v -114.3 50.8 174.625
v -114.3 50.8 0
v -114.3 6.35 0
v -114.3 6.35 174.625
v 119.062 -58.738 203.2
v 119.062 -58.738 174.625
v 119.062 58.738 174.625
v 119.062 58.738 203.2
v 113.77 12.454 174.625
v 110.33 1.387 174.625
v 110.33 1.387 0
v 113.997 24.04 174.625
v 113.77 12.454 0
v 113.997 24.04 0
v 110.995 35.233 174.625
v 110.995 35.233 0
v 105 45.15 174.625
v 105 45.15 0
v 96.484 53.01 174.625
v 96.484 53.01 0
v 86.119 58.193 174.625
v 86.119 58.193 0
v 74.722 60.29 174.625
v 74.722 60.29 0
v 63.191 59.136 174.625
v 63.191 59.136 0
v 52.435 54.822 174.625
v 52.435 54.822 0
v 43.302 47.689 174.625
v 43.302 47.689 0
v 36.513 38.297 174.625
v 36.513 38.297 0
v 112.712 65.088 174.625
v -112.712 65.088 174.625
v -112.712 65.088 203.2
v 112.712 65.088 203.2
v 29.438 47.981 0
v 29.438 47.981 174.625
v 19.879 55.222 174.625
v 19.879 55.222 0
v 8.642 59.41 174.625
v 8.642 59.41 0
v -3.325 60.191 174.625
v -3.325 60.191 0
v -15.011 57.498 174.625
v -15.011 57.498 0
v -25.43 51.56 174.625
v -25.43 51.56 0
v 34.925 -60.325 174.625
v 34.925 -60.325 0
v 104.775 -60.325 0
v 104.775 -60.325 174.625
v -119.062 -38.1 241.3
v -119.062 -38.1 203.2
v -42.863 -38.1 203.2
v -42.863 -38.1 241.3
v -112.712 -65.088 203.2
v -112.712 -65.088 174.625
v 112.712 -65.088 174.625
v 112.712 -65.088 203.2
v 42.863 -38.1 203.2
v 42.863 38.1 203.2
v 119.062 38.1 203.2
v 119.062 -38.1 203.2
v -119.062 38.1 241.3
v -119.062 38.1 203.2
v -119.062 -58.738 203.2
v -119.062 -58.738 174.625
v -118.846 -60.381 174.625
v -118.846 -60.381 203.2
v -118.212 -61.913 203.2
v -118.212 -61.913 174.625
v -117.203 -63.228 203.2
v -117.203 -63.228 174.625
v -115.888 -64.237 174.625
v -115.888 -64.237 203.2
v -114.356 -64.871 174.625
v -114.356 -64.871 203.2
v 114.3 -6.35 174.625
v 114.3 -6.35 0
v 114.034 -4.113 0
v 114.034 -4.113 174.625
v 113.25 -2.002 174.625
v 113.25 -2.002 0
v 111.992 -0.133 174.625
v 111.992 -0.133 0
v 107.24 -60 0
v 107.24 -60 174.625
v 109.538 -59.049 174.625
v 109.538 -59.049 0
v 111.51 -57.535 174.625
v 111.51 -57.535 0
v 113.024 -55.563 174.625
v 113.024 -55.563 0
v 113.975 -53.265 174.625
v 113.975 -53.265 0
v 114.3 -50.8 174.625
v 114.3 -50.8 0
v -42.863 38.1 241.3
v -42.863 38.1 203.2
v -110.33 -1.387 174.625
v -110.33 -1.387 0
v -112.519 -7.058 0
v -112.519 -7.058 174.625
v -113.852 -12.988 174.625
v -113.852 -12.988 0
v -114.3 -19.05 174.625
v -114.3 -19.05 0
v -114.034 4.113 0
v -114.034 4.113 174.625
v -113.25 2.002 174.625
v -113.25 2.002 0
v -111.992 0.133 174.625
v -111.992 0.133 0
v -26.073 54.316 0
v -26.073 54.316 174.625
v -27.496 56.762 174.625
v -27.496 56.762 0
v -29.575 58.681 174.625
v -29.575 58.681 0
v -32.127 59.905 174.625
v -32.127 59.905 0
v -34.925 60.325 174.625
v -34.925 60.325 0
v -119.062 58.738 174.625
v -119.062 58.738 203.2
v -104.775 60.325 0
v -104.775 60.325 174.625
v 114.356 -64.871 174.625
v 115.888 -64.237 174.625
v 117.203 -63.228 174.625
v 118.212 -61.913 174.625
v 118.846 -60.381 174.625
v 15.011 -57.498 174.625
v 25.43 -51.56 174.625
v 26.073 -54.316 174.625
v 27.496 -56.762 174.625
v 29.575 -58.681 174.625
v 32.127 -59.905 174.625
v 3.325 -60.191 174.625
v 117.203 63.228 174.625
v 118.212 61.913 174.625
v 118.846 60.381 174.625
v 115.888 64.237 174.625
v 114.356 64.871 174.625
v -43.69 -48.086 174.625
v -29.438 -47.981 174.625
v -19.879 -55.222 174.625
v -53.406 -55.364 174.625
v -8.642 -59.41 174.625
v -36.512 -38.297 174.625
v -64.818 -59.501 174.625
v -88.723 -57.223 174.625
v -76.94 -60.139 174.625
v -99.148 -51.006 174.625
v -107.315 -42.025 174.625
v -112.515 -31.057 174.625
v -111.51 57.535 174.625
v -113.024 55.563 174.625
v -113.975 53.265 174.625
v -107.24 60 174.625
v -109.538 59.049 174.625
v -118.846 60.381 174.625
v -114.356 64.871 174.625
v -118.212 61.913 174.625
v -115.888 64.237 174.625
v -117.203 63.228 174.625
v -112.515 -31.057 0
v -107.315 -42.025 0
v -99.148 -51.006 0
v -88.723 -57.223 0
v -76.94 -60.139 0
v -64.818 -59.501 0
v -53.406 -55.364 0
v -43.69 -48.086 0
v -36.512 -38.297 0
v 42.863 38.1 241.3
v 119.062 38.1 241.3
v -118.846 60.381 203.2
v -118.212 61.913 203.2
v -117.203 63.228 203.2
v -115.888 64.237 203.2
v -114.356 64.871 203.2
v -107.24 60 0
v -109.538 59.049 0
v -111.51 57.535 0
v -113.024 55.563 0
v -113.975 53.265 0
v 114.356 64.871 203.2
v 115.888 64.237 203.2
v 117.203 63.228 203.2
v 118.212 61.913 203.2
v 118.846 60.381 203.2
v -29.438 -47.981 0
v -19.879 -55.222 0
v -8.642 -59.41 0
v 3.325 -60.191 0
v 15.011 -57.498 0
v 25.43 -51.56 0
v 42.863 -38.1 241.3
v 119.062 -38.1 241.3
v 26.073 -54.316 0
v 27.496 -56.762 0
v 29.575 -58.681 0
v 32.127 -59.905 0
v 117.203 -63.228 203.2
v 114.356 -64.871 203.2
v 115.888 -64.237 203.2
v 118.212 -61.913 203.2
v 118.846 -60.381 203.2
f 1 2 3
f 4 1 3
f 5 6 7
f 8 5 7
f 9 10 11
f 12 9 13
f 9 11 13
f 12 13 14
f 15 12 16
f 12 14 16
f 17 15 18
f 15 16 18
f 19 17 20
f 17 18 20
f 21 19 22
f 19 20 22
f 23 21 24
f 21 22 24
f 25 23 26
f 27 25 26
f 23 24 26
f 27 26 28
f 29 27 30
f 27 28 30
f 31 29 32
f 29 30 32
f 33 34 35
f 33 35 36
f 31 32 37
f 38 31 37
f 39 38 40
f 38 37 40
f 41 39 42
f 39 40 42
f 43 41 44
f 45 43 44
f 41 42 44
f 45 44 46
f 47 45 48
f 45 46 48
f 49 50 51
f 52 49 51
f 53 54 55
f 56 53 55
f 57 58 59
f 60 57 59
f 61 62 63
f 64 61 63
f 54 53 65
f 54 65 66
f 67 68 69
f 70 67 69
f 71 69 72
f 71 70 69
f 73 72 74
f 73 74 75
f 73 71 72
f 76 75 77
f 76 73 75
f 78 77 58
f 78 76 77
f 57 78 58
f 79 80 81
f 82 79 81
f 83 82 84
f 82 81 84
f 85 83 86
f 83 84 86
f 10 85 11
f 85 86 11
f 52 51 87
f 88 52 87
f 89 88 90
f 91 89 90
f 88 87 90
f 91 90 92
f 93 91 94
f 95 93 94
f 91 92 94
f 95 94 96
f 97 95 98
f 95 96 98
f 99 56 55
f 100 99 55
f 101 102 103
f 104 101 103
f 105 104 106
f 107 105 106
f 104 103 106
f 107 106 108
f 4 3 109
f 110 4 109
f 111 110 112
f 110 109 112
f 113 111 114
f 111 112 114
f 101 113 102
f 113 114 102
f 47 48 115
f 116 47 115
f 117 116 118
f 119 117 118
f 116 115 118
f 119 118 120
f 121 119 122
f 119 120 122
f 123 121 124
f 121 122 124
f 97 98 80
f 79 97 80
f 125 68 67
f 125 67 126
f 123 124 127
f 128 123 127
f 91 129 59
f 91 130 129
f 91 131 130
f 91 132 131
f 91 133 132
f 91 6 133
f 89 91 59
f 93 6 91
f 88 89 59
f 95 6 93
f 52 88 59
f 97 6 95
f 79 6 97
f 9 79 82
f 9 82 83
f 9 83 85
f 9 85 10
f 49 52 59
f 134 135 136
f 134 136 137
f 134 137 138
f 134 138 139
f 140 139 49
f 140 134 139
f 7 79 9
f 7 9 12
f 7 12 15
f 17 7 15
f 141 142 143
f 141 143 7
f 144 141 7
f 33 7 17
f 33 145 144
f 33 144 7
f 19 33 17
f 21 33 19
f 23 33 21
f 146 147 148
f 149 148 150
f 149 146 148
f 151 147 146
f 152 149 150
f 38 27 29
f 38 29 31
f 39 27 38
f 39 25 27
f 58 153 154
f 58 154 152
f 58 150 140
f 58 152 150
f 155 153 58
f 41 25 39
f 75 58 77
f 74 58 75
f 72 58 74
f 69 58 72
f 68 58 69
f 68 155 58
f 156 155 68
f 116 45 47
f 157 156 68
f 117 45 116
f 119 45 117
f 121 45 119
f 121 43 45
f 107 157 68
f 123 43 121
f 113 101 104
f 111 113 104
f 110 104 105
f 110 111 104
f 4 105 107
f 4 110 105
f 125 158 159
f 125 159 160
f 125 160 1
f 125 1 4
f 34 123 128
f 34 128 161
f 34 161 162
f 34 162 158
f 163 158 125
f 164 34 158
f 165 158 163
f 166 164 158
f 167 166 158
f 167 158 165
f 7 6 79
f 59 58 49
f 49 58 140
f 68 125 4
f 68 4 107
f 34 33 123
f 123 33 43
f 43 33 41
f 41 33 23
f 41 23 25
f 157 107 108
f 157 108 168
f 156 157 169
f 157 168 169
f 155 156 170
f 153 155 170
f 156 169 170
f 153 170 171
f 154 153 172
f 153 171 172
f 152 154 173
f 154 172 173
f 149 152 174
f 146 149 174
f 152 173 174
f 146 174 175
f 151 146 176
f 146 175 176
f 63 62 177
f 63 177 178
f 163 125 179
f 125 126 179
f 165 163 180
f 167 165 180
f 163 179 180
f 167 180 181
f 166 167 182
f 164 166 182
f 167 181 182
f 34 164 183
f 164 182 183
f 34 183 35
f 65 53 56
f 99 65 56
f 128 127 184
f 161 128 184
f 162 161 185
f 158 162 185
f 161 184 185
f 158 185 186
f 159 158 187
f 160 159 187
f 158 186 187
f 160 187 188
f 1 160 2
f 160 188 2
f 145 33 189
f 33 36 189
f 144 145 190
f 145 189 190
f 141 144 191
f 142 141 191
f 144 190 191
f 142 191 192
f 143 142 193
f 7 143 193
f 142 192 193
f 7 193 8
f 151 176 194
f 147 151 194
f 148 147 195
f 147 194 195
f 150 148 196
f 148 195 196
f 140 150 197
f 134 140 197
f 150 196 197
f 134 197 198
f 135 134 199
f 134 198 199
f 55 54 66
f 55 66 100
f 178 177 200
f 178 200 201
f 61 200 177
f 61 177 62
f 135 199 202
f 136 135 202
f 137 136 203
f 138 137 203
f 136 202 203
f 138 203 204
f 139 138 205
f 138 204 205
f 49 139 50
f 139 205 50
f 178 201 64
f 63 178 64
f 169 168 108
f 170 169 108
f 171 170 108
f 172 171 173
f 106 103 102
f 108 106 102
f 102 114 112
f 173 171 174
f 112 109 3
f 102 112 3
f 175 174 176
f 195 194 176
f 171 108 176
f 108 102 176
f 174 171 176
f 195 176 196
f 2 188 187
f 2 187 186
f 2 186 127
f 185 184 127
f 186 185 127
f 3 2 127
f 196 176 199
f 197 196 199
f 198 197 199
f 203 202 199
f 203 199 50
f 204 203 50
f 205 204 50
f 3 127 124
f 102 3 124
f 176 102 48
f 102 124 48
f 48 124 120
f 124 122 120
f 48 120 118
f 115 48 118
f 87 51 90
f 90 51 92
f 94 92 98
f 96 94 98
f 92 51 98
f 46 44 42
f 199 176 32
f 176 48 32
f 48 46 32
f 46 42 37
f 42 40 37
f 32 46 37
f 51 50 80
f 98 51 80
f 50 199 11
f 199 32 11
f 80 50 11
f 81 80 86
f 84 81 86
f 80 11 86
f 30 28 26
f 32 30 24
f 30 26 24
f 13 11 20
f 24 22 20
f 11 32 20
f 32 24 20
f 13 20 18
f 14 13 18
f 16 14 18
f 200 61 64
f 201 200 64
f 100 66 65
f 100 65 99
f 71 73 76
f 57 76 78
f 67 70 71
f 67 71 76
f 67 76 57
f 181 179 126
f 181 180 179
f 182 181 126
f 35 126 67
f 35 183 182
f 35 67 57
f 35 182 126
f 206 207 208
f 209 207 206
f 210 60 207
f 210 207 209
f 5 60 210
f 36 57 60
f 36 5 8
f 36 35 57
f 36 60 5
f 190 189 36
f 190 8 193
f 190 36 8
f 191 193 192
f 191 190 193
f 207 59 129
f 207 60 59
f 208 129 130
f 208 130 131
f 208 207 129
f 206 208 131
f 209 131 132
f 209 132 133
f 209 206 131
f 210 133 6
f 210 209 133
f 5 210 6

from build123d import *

# Parameters (mm, degrees)
SKETCH1_W                    = 238.125
SKETCH1_H                    = 130.175
BOSS_EXTRUDE1_DEPTH          = 203.2
SKETCH2_W                    = 238.125
SKETCH2_H                    = 130.175
CUT_EXTRUDE1_DEPTH           = 174.625
FILLET1_R                    = 6.35
TERMINAL_START               = -38.1
TERMINAL_CLEARANCE_OUTLINE_W = 76.2
TERMINAL_CLEARANCE_OUTLINE_H = 38.1
TERMINAL_CLEARANCE_DEPTH     = 76.2


# Read off the part's stored shape, not the designer's step: Terminal clearance
with BuildPart() as part:
    # Sketch1 → Boss-Extrude1 (new body)
    with BuildSketch(Plane.XY):
        Rectangle(SKETCH1_W, SKETCH1_H)
    extrude(amount=BOSS_EXTRUDE1_DEPTH)

    # Sketch2 → Cut-Extrude1 (cut)
    with BuildSketch(Plane(origin=(0, 0, 0), x_dir=(-1, 0, 0), z_dir=(0, 0, -1))):
        Rectangle(SKETCH2_W, SKETCH2_H)
        with BuildLine():
            ThreePointArc((114.3, -19.05), (82.938934322, -59.116688549), (36.5125, -38.297414599))
            ThreePointArc((36.5125, -38.297414599), (8.641725006, -59.410205821), (-25.430393972, -51.56031663))
            ThreePointArc((-25.430393972, -51.56031663), (-28.464210223, -57.798844223), (-34.925, -60.325))
            Line((-34.925, -60.325), (-104.775, -60.325))
            ThreePointArc((-104.775, -60.325), (-111.510192091, -57.535192091), (-114.3, -50.8))
            Line((-114.3, -50.8), (-114.3, -6.35))
            ThreePointArc((-114.3, -6.35), (-113.249567583, -2.001744111), (-110.329957107, 1.387446384))
            ThreePointArc((-110.329957107, 1.387446384), (-91.484237132, 55.967234316), (-36.5125, 38.297414599))
            ThreePointArc((-36.5125, 38.297414599), (-8.641725006, 59.410205821), (25.430393972, 51.56031663))
            ThreePointArc((25.430393972, 51.56031663), (28.464210223, 57.798844223), (34.925, 60.325))
            Line((34.925, 60.325), (104.775, 60.325))
            ThreePointArc((104.775, 60.325), (111.510192091, 57.535192091), (114.3, 50.8))
            Line((114.3, 50.8), (114.3, 6.35))
            ThreePointArc((114.3, 6.35), (113.249567583, 2.001744111), (110.329957107, -1.387446384))
            ThreePointArc((110.329957107, -1.387446384), (113.295260302, -9.998383558), (114.3, -19.05))
        make_face(mode=Mode.SUBTRACT)
    extrude(amount=-CUT_EXTRUDE1_DEPTH, mode=Mode.SUBTRACT)

    # Fillet1
    fillet1_edges = [part.edges().sort_by_distance(p)[0] for p in [
        (119.0625, -65.0875, 188.9125),
        (-119.0625, -65.0875, 188.9125),
        (-119.0625, 65.0875, 188.9125),
        (119.0625, 65.0875, 188.9125),
    ]]
    fillet(fillet1_edges, radius=FILLET1_R)


with BuildPart() as body_2:
    # Terminal clearance outline → Terminal clearance (new body)
    with BuildSketch(Plane(origin=(0, 0, 0), x_dir=(1, 0, 0), z_dir=(0, 1, 0)).offset(TERMINAL_START)):
        with Locations((-80.9625, -222.25)):
            Rectangle(TERMINAL_CLEARANCE_OUTLINE_W, TERMINAL_CLEARANCE_OUTLINE_H)
        with Locations((80.9625, -222.25)):
            Rectangle(TERMINAL_CLEARANCE_OUTLINE_W, TERMINAL_CLEARANCE_OUTLINE_H)
    extrude(amount=TERMINAL_CLEARANCE_DEPTH)


solid = Compound([part.part, body_2.part])
